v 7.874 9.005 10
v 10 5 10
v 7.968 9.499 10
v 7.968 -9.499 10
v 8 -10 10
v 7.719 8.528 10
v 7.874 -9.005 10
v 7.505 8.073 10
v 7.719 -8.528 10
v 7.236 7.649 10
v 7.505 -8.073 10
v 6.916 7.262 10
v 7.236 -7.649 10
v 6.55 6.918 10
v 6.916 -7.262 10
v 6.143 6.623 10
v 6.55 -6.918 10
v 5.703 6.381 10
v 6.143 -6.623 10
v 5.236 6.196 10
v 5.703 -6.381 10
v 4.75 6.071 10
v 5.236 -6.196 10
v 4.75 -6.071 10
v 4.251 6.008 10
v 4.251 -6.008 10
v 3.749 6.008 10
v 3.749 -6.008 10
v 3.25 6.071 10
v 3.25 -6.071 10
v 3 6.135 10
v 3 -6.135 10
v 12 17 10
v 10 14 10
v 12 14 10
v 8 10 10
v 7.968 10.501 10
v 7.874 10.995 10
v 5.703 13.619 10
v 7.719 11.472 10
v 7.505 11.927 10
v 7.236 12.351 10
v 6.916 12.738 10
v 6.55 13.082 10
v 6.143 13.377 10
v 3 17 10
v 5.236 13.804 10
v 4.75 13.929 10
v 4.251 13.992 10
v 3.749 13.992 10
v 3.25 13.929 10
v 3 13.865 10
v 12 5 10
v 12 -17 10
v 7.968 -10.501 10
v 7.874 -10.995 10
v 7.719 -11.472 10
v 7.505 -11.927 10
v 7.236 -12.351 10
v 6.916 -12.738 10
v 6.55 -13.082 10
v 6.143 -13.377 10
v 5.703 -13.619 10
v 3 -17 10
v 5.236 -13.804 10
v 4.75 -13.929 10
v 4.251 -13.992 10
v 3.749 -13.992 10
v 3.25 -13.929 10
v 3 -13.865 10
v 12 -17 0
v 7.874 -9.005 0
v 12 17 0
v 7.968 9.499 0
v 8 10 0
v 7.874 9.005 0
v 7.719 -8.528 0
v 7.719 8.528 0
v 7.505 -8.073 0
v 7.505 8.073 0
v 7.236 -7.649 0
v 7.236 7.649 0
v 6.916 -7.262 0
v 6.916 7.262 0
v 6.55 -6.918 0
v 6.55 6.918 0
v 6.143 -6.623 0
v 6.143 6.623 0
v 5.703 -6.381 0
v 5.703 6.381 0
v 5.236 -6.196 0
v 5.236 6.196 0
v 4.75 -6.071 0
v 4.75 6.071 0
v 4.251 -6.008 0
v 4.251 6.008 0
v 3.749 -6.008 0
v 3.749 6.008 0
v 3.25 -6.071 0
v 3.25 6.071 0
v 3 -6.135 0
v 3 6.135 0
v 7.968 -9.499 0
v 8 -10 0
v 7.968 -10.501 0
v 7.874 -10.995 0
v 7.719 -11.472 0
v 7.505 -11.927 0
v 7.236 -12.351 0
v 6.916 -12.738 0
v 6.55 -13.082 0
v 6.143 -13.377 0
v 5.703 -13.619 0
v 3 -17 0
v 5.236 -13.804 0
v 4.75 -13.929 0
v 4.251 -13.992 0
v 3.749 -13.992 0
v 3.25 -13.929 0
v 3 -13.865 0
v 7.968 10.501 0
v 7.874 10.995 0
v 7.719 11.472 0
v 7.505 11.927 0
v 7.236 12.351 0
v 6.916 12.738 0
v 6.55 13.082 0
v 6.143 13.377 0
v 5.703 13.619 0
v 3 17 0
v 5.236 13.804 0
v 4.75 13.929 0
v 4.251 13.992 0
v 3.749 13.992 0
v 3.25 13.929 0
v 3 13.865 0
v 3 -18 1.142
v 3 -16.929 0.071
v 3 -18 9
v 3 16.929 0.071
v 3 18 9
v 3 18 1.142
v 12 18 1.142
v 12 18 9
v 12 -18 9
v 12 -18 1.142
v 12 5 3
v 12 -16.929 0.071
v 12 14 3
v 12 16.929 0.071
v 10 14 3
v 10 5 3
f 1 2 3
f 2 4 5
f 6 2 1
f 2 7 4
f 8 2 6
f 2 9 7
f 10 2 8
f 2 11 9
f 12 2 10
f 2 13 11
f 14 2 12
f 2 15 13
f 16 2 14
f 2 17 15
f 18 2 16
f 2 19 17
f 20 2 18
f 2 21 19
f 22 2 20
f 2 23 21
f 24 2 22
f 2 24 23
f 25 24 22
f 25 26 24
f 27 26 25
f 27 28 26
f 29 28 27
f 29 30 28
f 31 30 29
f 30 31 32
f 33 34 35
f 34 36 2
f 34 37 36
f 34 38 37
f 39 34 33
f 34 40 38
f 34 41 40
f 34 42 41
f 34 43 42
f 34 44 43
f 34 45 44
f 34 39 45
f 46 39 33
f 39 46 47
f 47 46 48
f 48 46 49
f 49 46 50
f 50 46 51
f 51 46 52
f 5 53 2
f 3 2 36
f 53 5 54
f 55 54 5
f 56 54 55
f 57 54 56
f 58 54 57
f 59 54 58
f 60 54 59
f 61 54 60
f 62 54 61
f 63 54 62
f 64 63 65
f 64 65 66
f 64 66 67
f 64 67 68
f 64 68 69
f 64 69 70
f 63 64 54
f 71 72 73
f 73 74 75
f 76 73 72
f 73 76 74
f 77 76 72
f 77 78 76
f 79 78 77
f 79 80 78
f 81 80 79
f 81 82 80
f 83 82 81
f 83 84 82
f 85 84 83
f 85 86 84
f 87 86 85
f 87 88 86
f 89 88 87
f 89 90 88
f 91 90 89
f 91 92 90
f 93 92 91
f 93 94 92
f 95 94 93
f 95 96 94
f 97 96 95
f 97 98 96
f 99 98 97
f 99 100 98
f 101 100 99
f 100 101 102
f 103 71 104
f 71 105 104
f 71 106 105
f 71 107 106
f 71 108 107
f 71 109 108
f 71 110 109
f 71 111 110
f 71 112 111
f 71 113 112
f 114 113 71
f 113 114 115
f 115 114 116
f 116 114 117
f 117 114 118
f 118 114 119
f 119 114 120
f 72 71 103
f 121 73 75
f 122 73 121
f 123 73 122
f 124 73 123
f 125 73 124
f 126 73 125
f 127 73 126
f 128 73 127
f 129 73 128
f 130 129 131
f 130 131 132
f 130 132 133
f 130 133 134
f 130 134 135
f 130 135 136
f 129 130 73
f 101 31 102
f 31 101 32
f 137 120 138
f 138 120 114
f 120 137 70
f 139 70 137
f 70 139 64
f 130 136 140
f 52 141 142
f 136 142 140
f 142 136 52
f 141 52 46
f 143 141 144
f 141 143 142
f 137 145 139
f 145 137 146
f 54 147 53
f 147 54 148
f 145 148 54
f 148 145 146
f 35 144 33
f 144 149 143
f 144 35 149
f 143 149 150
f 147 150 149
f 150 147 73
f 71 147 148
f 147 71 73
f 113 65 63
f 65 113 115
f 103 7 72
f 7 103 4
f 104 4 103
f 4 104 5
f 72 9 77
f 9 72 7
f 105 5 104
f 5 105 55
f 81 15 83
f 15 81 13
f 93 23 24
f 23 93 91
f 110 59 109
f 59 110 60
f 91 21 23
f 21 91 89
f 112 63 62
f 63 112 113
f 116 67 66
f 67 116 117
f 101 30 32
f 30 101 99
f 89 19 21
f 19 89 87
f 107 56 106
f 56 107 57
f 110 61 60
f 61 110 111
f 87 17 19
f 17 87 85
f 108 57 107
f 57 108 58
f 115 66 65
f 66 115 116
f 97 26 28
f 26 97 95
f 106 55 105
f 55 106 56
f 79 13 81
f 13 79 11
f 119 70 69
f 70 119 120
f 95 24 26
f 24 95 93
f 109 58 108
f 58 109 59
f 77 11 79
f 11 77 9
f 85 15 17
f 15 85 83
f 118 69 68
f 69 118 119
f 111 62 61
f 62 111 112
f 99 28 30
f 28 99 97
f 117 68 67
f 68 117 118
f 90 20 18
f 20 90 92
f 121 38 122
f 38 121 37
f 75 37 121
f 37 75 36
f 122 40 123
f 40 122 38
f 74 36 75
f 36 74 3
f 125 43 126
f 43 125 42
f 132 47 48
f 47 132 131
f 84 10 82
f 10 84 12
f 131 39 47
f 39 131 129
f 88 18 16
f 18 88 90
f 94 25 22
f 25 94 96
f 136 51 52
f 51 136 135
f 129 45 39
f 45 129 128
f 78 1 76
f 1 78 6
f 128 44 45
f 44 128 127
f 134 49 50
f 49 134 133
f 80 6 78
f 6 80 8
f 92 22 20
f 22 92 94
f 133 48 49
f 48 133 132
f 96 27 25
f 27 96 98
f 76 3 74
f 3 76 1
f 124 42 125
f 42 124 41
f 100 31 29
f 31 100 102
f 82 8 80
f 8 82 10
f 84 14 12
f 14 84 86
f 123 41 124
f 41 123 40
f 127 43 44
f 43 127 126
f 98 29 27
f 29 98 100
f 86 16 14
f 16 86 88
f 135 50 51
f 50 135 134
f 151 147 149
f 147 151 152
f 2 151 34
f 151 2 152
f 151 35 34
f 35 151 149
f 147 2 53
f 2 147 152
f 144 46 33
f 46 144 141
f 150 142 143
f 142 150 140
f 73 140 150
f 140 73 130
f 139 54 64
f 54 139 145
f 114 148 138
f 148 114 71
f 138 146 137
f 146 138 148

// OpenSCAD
// file: parameters.scad
// PRUSA iteration3
// Y frame corners
// GNU GPL v3
// Josef Průša <iam@josefprusa.cz> and contributors
// http://www.reprap.org/wiki/Prusa_Mendel
// http://prusamendel.org
// Parameterized by D. Scott Williamson

// MASTER PARAMETERS FILE

// Default to original metric 
metric=true;

// mm in an inch (comversion rate)
inch2mm=25.4;

// Default facets for cylinders
$fn=30;

// Parameters related to printer base 
// affected parts:
//		y-corners.scad
//		y-motor.scad
// 		y-idler.scad
// 		y-distance.scad

	// horizontal rod dimensions
	horizontal_rod_radius = (metric ? 4 : ((5/16)*inch2mm/2));
	horizontal_rod_hole_radius= horizontal_rod_radius + 0.4;
	horizontal_rod_length=270;
	horizontal_rod_bridge_radius=2.6;
	horizontal_rod_washer_radius=(metric ? 10 : ((15/16)*inch2mm/2));
	horizontal_rod_lower_height=horizontal_rod_washer_radius;
	horizontal_rod_upper_height=horizontal_rod_washer_radius*3;
	
	// longitudinal rod dimensions
	longitudinal_rod_radius= (metric ? 5 : ((1/2)*inch2mm/2));
	longitudinal_rod_hole_radius= longitudinal_rod_radius + 0.4;
	longitudinal_rod_length=270;
	longitudinal_rod_height=20;
	
	longitudinal_rod_washer_radius=(metric ? 11 : ((1+3/8)*inch2mm/2));
	longitudinal_rod_washer_hole_radius=longitudinal_rod_washer_radius + 0.4;
	longitudinal_rod_washer_thickness=10;
	
	smooth_rod_radius=4.2;
	smooth_rod_length=10;
	smooth_rod_height=47;
	smooth_rod_end_thickness=2.75;
	
	corner_width=(longitudinal_rod_radius*2)+8;
	corner_height=(horizontal_rod_radius*2)+14;
	corner_depth=49;
	
	lm8uu_keepout_radius=8;
	lm8uu_keepout_length=270;
	lm8uu_keepout_height=smooth_rod_height-1;
	lm8uu_keepout_offset=12.5;
	
	ziptie_width=3.5;
	ziptie_length=30;
	ziptie_height=2;
// main file
// PRUSA iteration3
// Y motor distance spacer
// GNU GPL v3
// Josef Průša <iam@josefprusa.cz> and contributors
// http://www.reprap.org/wiki/Prusa_Mendel
// http://prusamendel.org
// Parameterized by D. Scott Williamson

// Include master parameters file
include <parameters.scad>;

// Override metric setting here if desired (anywhere after include)
//metric=false;

difference()
{

//body    
union()
{
    translate([3,-18,0]) cube([5,36,10]);
    translate([8,-18,0]) cube([4,36,10]);
}


union()
{
    //rods
    translate(v = [4,-10,-1]) cylinder(h = 12, r=4, $fn=50);	
    translate(v = [4,10,-1]) cylinder(h = 12, r=4, $fn=50);
    //cables
    translate([10,5,3]) cube([8,9,10]);
}

        //corners
        translate([-5,24,3]) rotate([45,0,0]) cube([20,10,10]);
        translate([-5,24,-7]) rotate([45,0,0]) cube([20,10,10]);
        translate([-5,-24,3]) rotate([45,0,0]) cube([20,10,10]);
        translate([-5,-24,-7]) rotate([45,0,0]) cube([20,10,10]);
}
